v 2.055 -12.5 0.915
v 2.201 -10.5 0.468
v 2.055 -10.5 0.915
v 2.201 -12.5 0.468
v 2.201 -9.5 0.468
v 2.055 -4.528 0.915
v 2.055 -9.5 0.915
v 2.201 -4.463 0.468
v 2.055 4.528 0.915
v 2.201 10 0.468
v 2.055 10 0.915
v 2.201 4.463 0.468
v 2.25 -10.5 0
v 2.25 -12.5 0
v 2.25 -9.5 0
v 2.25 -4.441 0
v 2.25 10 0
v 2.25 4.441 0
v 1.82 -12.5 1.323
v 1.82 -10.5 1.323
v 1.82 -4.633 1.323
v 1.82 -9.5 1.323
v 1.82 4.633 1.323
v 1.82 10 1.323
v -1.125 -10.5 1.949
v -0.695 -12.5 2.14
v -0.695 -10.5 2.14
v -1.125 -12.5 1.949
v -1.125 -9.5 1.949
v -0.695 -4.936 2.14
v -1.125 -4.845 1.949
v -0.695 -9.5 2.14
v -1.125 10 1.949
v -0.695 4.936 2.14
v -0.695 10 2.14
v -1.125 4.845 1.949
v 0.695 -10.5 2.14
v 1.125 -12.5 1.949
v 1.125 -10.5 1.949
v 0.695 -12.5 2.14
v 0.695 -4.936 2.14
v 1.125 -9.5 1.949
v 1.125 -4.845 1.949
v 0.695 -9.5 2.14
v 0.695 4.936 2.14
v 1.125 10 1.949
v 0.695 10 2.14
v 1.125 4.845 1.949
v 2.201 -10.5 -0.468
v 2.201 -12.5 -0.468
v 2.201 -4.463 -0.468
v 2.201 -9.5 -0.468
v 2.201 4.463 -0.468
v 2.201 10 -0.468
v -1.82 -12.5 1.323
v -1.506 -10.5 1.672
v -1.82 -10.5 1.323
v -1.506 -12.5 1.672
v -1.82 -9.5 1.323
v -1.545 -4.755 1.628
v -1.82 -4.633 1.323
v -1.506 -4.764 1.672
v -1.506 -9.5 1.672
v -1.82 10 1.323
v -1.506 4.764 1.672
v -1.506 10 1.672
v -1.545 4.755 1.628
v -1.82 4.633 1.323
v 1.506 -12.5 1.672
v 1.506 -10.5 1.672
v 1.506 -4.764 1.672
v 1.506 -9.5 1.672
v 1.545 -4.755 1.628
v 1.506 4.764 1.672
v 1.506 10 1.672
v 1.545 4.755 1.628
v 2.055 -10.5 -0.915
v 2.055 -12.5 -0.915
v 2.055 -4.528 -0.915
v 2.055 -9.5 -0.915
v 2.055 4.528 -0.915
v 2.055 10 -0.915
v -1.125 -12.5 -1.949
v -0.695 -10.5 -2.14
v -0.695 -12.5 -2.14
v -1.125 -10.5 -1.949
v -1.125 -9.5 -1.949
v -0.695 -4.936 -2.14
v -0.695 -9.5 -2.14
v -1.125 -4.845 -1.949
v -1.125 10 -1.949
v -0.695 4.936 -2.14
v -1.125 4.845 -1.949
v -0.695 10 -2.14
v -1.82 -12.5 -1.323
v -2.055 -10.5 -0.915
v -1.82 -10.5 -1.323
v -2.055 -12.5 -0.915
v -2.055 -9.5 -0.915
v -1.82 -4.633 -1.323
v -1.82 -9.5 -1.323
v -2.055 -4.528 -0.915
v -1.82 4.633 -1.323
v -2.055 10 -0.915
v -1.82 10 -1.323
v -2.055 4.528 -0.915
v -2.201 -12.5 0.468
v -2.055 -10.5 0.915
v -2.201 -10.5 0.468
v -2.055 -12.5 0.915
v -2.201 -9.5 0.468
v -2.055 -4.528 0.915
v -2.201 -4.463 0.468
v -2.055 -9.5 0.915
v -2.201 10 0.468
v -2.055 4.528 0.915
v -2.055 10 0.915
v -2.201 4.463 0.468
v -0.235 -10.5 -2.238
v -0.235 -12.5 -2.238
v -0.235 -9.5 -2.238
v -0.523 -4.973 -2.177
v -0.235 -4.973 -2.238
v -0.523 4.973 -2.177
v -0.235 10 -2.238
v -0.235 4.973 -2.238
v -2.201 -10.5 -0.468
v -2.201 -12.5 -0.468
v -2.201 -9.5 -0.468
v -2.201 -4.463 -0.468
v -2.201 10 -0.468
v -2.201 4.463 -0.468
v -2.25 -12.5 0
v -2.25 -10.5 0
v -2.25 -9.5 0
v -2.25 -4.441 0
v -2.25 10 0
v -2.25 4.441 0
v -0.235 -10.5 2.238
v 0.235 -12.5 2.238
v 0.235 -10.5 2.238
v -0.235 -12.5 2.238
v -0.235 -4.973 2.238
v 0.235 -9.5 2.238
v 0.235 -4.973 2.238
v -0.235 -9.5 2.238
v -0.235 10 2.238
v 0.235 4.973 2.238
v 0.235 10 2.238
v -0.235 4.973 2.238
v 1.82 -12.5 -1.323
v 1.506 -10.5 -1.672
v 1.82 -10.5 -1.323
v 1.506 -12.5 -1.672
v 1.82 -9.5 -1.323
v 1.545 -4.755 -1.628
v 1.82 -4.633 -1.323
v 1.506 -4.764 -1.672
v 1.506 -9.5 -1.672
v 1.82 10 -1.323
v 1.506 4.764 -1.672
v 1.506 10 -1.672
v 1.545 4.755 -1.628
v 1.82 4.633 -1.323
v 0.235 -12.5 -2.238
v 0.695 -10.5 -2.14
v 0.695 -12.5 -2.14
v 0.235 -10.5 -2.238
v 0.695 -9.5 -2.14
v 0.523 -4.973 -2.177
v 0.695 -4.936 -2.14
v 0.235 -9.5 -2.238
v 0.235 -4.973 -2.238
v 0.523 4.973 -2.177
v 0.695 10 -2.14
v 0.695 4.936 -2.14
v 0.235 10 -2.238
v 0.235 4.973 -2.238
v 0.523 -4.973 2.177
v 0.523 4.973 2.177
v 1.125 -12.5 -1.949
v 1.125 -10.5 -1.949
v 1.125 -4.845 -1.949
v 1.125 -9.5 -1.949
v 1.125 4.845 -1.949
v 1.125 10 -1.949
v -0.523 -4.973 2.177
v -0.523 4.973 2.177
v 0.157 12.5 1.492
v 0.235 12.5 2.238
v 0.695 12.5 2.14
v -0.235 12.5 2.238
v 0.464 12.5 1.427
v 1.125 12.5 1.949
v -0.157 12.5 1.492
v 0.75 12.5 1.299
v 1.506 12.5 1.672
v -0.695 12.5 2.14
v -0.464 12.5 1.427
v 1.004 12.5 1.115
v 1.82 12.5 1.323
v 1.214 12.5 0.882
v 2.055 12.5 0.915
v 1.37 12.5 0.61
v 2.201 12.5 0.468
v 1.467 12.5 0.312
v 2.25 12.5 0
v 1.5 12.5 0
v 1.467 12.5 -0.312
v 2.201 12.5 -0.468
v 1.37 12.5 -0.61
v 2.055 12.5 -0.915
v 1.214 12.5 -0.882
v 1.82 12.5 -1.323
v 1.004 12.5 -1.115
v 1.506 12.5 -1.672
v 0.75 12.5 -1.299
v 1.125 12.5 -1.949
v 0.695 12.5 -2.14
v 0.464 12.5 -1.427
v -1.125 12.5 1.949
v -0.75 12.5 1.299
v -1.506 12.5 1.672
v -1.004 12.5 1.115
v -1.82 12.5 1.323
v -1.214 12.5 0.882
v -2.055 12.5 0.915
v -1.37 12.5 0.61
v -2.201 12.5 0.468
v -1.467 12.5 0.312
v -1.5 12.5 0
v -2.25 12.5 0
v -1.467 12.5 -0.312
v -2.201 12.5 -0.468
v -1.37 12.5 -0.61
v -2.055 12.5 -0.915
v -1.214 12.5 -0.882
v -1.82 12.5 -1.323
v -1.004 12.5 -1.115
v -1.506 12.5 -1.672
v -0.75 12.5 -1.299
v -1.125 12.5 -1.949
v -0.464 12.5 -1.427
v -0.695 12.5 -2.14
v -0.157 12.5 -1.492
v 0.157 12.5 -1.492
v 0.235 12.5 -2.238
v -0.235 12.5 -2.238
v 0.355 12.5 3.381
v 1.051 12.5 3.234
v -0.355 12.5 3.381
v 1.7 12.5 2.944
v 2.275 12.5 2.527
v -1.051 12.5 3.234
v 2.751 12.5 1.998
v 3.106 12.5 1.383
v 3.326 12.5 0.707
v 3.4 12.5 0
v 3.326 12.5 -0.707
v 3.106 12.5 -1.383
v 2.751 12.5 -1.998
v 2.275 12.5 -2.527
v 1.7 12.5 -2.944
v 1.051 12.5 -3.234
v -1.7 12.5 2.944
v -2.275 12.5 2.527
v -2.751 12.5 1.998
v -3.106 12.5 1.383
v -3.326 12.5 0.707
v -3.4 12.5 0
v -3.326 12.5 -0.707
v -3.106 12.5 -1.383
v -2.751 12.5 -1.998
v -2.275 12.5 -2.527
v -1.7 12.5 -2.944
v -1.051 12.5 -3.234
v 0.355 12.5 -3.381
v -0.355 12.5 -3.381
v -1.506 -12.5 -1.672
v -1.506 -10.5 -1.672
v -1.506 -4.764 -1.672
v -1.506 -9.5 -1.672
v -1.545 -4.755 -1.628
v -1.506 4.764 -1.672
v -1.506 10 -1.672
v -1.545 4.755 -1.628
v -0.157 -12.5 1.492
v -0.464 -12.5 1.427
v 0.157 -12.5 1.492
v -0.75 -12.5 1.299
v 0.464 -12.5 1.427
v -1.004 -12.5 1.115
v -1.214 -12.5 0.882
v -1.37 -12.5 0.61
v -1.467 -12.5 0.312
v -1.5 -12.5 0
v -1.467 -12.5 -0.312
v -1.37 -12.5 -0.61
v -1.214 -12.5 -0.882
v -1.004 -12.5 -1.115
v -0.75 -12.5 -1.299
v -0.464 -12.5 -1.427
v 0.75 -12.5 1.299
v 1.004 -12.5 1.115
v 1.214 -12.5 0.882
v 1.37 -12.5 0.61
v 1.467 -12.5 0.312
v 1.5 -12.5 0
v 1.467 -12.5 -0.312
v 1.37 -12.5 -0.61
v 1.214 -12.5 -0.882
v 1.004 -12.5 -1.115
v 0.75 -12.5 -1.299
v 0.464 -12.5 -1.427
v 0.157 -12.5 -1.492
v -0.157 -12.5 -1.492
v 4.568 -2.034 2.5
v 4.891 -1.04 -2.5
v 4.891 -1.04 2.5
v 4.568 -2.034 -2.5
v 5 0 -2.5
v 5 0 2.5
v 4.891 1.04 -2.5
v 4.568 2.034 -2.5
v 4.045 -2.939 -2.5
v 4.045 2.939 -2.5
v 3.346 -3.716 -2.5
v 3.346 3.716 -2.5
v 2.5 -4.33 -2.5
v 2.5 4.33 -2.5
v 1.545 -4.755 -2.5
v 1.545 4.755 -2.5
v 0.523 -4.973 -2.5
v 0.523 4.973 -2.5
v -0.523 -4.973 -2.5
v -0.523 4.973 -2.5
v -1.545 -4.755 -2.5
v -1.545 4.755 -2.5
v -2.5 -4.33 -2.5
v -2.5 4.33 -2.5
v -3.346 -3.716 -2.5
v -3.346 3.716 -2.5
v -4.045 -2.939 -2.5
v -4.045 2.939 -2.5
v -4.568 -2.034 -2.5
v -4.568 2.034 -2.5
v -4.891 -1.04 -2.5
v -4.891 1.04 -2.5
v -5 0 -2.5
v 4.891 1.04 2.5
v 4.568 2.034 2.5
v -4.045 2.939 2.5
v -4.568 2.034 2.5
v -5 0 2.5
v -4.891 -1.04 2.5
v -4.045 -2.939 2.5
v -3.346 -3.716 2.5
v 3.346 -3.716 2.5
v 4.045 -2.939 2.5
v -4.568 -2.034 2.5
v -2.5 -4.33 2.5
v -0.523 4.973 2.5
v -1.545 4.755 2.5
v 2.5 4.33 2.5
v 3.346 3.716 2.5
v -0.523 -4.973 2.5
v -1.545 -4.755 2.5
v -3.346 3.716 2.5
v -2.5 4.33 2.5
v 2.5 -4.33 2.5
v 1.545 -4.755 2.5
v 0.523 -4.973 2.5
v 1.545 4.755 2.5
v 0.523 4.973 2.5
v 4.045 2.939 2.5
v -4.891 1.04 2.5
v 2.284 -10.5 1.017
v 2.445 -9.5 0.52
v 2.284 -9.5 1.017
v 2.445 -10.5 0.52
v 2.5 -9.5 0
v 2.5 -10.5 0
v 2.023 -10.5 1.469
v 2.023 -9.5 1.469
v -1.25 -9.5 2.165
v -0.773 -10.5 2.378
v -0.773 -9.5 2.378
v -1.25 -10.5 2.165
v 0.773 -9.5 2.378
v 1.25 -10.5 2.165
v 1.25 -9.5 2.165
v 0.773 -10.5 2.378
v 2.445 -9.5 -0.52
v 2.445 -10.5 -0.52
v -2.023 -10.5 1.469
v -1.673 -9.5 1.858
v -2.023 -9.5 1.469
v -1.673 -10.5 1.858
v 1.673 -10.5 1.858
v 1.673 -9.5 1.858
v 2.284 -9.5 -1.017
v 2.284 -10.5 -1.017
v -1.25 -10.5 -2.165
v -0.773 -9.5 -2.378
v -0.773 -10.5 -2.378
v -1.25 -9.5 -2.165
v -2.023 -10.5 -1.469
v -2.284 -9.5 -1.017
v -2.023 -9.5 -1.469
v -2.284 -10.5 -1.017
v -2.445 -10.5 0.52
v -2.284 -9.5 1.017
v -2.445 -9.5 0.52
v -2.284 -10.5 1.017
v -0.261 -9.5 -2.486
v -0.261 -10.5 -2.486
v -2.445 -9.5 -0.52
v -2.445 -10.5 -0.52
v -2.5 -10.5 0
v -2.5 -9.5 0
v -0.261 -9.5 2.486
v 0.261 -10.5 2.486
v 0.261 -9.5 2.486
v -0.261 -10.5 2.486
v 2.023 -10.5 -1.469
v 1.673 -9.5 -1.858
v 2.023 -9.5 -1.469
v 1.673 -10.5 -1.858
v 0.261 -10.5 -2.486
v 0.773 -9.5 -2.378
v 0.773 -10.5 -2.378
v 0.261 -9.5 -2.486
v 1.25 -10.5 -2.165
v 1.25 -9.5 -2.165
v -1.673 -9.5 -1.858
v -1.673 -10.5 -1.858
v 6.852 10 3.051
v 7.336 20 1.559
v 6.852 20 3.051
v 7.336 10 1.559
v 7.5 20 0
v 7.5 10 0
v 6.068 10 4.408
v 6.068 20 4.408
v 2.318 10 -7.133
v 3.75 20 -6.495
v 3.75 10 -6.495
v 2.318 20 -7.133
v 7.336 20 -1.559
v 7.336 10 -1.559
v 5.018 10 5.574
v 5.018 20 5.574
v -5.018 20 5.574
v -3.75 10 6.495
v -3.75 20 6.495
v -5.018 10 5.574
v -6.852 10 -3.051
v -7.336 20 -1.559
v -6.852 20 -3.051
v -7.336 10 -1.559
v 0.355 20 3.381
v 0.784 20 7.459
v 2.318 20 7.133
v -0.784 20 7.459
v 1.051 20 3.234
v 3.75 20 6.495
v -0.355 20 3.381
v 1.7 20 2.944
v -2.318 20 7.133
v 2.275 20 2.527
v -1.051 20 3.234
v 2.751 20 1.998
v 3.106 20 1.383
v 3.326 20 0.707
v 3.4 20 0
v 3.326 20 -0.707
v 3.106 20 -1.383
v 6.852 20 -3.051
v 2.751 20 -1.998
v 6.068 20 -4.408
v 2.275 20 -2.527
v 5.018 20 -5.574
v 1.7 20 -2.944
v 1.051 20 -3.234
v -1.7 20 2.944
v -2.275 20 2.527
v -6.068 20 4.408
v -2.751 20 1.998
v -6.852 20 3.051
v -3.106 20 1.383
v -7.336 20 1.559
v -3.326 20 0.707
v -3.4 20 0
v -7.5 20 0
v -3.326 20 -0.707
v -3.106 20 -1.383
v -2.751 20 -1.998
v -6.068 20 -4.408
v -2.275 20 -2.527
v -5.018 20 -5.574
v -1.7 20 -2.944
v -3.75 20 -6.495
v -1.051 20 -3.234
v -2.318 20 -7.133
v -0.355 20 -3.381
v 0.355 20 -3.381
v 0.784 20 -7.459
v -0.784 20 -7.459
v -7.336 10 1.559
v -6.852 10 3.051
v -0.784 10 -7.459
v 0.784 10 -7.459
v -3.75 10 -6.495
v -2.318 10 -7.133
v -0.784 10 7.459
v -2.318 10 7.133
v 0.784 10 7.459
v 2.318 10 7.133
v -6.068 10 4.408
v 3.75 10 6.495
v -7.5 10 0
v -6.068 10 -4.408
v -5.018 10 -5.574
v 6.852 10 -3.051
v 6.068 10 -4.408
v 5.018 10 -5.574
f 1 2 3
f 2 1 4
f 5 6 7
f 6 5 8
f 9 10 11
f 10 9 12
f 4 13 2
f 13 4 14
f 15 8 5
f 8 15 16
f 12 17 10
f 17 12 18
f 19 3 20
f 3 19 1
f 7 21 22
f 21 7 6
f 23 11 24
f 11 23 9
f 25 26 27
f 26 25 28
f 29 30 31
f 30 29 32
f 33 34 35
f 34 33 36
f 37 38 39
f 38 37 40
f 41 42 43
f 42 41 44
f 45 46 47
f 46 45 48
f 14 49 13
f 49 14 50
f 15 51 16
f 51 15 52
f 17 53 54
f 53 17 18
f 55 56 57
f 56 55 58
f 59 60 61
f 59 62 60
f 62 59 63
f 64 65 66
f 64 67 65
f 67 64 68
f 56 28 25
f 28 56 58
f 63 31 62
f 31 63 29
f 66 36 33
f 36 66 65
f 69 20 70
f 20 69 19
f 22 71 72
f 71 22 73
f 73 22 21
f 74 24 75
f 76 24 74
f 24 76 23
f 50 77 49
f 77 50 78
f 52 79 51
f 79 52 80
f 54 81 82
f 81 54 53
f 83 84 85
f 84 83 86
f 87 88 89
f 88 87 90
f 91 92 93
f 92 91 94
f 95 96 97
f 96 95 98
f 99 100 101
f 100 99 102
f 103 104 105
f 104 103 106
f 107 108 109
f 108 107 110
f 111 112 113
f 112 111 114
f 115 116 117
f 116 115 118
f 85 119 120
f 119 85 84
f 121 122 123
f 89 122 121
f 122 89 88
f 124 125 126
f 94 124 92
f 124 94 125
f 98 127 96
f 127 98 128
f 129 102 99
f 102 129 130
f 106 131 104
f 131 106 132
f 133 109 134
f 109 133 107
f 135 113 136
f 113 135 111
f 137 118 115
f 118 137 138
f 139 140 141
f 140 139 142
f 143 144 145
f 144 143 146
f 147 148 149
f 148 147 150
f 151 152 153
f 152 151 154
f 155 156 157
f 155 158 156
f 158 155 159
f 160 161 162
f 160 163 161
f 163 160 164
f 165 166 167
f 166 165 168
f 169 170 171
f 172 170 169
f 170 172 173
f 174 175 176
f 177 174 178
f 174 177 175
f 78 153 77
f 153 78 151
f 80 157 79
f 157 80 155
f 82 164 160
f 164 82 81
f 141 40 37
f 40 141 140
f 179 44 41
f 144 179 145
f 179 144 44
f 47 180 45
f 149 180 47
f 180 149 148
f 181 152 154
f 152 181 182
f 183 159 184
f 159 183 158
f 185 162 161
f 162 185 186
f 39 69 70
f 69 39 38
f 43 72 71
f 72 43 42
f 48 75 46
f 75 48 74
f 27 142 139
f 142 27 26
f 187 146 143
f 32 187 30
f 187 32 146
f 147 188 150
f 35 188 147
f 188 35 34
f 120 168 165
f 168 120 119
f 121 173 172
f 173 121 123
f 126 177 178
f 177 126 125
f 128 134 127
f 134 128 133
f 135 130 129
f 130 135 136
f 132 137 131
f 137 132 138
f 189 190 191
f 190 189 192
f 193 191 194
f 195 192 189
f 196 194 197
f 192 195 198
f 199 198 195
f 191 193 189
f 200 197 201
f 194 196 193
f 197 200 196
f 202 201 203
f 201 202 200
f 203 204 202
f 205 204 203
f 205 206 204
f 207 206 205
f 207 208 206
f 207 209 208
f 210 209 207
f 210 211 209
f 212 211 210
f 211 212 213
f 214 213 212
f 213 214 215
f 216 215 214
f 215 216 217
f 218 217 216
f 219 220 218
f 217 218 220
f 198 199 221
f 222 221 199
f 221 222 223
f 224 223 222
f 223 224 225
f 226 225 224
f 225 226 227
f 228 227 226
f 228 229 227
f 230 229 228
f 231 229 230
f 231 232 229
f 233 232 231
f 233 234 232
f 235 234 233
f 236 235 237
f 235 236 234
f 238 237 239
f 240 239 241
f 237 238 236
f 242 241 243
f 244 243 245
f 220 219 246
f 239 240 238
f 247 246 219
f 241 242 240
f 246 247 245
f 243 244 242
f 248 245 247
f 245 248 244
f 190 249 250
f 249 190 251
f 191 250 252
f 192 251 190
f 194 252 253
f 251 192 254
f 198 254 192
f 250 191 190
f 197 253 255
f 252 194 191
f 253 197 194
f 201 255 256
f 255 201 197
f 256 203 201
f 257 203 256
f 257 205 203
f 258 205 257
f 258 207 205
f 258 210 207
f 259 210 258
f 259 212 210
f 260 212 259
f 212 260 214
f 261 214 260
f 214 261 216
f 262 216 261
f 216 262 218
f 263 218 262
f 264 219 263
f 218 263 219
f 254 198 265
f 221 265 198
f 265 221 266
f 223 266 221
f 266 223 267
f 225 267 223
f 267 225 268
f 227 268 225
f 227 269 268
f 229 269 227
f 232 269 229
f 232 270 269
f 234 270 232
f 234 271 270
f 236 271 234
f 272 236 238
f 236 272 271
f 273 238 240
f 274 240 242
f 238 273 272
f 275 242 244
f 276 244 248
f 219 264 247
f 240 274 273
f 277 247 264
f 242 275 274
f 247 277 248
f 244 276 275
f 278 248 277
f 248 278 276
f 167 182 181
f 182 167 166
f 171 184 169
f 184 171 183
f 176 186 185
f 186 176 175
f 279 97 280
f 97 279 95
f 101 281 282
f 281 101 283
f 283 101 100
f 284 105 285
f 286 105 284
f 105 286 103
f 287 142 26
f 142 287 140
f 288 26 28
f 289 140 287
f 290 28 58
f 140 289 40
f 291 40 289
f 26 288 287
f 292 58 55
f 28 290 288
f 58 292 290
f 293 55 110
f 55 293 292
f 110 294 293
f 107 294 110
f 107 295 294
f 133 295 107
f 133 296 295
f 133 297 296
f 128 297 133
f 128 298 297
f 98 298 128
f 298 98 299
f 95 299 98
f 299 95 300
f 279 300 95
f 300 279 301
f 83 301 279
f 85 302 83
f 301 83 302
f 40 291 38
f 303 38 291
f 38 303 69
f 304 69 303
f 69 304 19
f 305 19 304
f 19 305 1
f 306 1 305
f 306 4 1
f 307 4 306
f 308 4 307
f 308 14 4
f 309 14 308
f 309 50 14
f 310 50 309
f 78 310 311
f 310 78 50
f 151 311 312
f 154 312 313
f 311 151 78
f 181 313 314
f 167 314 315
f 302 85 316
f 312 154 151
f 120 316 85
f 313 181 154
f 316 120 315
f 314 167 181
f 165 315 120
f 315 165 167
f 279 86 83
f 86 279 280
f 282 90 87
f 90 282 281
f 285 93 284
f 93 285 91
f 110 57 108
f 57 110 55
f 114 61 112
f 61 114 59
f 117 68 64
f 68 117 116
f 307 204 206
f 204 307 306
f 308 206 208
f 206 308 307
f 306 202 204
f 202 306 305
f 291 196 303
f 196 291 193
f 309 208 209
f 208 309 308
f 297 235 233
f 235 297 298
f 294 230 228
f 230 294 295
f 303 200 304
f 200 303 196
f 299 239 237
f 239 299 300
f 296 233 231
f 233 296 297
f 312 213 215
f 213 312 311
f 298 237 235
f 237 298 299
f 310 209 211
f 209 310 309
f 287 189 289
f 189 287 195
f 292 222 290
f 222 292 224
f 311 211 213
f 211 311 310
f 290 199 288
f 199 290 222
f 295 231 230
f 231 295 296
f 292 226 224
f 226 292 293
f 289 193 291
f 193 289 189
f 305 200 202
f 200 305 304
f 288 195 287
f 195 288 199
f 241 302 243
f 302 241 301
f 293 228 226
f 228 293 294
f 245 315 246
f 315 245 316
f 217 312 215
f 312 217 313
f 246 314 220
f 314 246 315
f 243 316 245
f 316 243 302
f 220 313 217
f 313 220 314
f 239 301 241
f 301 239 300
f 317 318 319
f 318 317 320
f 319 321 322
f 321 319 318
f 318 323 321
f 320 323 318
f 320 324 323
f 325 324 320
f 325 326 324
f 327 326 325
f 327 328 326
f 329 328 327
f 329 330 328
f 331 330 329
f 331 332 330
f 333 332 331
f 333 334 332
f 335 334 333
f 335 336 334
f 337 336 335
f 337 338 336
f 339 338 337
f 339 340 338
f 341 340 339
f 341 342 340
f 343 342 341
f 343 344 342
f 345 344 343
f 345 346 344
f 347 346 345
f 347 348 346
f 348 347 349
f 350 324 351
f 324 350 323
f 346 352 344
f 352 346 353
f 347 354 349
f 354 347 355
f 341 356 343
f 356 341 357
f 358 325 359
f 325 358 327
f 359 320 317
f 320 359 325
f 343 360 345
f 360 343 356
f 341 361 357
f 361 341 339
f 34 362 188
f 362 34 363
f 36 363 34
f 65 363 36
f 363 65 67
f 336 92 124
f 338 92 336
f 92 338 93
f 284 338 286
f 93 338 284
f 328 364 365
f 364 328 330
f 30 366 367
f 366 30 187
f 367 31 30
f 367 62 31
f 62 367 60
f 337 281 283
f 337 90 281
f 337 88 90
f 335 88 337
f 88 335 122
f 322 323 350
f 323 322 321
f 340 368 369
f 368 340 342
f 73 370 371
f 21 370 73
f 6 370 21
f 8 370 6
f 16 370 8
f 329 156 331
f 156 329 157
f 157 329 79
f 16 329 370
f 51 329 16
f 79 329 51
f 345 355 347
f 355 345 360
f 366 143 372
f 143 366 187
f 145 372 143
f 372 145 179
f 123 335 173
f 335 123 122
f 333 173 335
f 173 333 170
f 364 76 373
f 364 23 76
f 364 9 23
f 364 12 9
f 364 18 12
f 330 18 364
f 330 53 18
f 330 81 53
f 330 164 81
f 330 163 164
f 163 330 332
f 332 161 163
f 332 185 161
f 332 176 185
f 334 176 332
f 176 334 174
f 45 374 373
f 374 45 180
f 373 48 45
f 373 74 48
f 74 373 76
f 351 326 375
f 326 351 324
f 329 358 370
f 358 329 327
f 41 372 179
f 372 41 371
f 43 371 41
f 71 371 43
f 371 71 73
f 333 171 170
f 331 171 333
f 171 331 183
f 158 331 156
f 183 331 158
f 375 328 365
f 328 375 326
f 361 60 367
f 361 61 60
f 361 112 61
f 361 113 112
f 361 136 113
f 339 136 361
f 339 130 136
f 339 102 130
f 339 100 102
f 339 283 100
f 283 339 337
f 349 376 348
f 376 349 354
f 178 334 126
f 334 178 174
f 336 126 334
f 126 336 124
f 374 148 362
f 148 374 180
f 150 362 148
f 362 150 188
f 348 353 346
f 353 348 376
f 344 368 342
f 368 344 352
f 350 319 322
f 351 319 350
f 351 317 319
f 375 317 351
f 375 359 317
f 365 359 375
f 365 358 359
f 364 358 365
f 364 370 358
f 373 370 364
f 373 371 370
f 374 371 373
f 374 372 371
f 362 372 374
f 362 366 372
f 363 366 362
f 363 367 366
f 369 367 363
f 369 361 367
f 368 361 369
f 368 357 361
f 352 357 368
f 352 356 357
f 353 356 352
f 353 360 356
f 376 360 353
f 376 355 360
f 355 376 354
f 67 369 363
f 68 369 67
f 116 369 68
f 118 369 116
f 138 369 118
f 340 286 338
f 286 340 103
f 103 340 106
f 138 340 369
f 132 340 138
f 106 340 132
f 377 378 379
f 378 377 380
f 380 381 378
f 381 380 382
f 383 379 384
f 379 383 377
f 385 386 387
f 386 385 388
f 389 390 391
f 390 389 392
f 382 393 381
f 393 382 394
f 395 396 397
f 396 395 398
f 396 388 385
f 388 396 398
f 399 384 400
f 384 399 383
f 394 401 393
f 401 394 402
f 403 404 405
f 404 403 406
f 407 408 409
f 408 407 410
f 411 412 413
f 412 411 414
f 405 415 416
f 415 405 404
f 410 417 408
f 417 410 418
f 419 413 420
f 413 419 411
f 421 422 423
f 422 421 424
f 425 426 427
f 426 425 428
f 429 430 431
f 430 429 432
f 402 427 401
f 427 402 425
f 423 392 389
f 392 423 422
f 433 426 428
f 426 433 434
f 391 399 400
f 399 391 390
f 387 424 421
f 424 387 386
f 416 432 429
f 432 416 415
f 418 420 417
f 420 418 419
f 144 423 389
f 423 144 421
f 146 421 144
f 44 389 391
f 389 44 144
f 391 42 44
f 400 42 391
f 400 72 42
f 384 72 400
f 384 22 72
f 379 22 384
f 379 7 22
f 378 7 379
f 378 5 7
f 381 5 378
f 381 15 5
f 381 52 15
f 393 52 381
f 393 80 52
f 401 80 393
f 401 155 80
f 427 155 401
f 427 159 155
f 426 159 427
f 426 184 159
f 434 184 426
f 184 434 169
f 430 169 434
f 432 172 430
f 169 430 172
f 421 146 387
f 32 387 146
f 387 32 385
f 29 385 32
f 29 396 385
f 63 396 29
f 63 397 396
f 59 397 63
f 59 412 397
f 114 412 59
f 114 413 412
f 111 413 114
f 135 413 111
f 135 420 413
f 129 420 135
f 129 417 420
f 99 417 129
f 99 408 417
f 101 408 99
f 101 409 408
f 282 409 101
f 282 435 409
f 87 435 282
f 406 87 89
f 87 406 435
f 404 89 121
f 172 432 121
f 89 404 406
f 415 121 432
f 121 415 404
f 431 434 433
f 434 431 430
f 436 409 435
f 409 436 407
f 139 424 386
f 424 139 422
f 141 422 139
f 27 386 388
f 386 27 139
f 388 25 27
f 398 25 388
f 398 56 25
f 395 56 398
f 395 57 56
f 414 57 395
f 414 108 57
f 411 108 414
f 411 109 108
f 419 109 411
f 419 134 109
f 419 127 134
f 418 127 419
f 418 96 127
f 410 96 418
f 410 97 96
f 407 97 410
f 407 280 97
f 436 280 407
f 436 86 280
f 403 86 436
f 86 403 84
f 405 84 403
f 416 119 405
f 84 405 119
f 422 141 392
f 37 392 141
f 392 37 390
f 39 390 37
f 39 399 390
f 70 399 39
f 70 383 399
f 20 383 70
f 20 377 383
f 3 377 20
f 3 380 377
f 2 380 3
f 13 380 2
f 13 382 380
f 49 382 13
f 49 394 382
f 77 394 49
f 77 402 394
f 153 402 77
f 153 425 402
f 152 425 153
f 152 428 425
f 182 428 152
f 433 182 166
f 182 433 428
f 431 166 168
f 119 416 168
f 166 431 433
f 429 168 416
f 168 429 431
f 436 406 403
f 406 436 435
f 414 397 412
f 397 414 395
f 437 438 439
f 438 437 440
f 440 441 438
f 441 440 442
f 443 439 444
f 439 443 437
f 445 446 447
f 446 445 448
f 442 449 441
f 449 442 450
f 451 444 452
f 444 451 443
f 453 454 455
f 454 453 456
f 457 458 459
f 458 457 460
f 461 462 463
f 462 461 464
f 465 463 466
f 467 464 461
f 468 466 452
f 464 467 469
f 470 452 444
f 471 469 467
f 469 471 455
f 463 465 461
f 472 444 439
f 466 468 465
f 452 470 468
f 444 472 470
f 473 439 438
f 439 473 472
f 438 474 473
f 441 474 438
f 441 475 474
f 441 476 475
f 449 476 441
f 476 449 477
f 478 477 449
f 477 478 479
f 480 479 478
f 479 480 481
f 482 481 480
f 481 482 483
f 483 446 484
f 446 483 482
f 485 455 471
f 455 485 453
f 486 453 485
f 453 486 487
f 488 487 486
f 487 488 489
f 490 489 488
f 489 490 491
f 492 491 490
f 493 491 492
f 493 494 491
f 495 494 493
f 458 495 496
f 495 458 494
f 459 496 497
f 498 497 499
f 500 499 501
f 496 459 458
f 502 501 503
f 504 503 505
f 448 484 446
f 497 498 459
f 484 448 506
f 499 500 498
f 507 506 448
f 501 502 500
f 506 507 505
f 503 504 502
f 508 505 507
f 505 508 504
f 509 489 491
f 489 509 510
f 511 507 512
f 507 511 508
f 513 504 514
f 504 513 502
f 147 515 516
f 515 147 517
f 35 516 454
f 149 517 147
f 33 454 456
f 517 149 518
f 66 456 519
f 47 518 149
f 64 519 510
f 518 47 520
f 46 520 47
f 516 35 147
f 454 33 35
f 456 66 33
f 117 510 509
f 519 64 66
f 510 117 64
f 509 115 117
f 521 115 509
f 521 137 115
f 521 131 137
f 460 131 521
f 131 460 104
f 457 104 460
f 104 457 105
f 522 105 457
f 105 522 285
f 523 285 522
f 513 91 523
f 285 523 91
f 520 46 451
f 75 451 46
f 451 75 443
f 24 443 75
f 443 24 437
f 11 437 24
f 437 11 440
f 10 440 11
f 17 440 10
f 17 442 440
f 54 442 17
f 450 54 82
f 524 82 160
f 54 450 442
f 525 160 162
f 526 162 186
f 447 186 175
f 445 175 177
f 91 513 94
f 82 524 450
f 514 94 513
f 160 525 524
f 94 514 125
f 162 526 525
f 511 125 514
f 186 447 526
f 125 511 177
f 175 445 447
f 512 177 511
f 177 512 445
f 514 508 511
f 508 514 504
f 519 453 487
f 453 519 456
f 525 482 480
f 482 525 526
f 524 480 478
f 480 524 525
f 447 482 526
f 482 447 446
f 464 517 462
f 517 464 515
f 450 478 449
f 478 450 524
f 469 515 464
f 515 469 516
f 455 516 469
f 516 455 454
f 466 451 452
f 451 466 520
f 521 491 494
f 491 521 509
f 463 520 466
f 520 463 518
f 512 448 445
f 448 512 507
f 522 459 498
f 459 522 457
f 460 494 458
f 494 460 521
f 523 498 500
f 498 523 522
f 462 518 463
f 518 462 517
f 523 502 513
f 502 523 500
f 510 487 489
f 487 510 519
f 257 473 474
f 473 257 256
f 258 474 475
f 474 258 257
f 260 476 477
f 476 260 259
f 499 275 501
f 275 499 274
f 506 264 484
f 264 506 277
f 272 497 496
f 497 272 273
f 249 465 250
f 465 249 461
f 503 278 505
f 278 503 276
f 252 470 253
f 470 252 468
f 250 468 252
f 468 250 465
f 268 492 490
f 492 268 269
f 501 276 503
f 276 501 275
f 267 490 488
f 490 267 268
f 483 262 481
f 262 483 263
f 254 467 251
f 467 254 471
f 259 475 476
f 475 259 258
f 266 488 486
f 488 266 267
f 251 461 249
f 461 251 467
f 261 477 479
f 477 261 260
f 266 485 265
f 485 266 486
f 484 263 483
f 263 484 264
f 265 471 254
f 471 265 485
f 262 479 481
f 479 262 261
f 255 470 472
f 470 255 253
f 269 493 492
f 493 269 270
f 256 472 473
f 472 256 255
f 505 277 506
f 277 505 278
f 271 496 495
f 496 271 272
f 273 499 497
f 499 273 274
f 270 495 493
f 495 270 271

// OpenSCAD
Laenge = 25;

Leitung = true;
Mitte = true;
Haken1 = true;
Haken2 = false;
Adapter = true;

if (Leitung) rotate([90,0,0]) Leitung();
if (Mitte) rotate([90,0,0]) Mitte();
if (Haken1) rotate([90,0,0]) Haken1();
if (Haken2) rotate([90,0,0]) Haken2();
if (Adapter) rotate([90,0,0]) Adapter();
    
module Leitung() {
    $fn=30;
    difference() {
        cylinder(d=4.5, h=Laenge, center=true);
        cylinder(d=3, h=Laenge+2, center=true);
    }
        
} 

module Mitte() {

    difference() {
        $fn=30;
        // Mitte
        rotate([90,0,0])
        cylinder(d=10,h=5, center= true);
        cylinder(d=3, h=Laenge+2, center=true);
    }
}

module Haken1() {
    $fn=30;
    
    difference() {
        union() {
            translate([0,0,10])
            cylinder(d=5,h=1, center= true);
        }
        cylinder(d=3, h=Laenge+2, center=true);
    }
}

module Haken2() {
    $fn=30;
    
    difference() {
        union() {
            translate([0,0,7])
            cylinder(d=5,h=1, center= true);
        }
        cylinder(d=3, h=Laenge+2, center=true);
    }
}

module Adapter() {
    $fn=30;

    translate([0,0,-10])
    difference() {
        union() {
            translate([0,0,-5])
            cylinder(d=15,h=10, center= true);
        }
        cylinder(d=4, h=Laenge+2, center=true);
        translate([0,0,-10])
        cylinder(d=6.8, h=Laenge-10, center=true);
    }
}   
